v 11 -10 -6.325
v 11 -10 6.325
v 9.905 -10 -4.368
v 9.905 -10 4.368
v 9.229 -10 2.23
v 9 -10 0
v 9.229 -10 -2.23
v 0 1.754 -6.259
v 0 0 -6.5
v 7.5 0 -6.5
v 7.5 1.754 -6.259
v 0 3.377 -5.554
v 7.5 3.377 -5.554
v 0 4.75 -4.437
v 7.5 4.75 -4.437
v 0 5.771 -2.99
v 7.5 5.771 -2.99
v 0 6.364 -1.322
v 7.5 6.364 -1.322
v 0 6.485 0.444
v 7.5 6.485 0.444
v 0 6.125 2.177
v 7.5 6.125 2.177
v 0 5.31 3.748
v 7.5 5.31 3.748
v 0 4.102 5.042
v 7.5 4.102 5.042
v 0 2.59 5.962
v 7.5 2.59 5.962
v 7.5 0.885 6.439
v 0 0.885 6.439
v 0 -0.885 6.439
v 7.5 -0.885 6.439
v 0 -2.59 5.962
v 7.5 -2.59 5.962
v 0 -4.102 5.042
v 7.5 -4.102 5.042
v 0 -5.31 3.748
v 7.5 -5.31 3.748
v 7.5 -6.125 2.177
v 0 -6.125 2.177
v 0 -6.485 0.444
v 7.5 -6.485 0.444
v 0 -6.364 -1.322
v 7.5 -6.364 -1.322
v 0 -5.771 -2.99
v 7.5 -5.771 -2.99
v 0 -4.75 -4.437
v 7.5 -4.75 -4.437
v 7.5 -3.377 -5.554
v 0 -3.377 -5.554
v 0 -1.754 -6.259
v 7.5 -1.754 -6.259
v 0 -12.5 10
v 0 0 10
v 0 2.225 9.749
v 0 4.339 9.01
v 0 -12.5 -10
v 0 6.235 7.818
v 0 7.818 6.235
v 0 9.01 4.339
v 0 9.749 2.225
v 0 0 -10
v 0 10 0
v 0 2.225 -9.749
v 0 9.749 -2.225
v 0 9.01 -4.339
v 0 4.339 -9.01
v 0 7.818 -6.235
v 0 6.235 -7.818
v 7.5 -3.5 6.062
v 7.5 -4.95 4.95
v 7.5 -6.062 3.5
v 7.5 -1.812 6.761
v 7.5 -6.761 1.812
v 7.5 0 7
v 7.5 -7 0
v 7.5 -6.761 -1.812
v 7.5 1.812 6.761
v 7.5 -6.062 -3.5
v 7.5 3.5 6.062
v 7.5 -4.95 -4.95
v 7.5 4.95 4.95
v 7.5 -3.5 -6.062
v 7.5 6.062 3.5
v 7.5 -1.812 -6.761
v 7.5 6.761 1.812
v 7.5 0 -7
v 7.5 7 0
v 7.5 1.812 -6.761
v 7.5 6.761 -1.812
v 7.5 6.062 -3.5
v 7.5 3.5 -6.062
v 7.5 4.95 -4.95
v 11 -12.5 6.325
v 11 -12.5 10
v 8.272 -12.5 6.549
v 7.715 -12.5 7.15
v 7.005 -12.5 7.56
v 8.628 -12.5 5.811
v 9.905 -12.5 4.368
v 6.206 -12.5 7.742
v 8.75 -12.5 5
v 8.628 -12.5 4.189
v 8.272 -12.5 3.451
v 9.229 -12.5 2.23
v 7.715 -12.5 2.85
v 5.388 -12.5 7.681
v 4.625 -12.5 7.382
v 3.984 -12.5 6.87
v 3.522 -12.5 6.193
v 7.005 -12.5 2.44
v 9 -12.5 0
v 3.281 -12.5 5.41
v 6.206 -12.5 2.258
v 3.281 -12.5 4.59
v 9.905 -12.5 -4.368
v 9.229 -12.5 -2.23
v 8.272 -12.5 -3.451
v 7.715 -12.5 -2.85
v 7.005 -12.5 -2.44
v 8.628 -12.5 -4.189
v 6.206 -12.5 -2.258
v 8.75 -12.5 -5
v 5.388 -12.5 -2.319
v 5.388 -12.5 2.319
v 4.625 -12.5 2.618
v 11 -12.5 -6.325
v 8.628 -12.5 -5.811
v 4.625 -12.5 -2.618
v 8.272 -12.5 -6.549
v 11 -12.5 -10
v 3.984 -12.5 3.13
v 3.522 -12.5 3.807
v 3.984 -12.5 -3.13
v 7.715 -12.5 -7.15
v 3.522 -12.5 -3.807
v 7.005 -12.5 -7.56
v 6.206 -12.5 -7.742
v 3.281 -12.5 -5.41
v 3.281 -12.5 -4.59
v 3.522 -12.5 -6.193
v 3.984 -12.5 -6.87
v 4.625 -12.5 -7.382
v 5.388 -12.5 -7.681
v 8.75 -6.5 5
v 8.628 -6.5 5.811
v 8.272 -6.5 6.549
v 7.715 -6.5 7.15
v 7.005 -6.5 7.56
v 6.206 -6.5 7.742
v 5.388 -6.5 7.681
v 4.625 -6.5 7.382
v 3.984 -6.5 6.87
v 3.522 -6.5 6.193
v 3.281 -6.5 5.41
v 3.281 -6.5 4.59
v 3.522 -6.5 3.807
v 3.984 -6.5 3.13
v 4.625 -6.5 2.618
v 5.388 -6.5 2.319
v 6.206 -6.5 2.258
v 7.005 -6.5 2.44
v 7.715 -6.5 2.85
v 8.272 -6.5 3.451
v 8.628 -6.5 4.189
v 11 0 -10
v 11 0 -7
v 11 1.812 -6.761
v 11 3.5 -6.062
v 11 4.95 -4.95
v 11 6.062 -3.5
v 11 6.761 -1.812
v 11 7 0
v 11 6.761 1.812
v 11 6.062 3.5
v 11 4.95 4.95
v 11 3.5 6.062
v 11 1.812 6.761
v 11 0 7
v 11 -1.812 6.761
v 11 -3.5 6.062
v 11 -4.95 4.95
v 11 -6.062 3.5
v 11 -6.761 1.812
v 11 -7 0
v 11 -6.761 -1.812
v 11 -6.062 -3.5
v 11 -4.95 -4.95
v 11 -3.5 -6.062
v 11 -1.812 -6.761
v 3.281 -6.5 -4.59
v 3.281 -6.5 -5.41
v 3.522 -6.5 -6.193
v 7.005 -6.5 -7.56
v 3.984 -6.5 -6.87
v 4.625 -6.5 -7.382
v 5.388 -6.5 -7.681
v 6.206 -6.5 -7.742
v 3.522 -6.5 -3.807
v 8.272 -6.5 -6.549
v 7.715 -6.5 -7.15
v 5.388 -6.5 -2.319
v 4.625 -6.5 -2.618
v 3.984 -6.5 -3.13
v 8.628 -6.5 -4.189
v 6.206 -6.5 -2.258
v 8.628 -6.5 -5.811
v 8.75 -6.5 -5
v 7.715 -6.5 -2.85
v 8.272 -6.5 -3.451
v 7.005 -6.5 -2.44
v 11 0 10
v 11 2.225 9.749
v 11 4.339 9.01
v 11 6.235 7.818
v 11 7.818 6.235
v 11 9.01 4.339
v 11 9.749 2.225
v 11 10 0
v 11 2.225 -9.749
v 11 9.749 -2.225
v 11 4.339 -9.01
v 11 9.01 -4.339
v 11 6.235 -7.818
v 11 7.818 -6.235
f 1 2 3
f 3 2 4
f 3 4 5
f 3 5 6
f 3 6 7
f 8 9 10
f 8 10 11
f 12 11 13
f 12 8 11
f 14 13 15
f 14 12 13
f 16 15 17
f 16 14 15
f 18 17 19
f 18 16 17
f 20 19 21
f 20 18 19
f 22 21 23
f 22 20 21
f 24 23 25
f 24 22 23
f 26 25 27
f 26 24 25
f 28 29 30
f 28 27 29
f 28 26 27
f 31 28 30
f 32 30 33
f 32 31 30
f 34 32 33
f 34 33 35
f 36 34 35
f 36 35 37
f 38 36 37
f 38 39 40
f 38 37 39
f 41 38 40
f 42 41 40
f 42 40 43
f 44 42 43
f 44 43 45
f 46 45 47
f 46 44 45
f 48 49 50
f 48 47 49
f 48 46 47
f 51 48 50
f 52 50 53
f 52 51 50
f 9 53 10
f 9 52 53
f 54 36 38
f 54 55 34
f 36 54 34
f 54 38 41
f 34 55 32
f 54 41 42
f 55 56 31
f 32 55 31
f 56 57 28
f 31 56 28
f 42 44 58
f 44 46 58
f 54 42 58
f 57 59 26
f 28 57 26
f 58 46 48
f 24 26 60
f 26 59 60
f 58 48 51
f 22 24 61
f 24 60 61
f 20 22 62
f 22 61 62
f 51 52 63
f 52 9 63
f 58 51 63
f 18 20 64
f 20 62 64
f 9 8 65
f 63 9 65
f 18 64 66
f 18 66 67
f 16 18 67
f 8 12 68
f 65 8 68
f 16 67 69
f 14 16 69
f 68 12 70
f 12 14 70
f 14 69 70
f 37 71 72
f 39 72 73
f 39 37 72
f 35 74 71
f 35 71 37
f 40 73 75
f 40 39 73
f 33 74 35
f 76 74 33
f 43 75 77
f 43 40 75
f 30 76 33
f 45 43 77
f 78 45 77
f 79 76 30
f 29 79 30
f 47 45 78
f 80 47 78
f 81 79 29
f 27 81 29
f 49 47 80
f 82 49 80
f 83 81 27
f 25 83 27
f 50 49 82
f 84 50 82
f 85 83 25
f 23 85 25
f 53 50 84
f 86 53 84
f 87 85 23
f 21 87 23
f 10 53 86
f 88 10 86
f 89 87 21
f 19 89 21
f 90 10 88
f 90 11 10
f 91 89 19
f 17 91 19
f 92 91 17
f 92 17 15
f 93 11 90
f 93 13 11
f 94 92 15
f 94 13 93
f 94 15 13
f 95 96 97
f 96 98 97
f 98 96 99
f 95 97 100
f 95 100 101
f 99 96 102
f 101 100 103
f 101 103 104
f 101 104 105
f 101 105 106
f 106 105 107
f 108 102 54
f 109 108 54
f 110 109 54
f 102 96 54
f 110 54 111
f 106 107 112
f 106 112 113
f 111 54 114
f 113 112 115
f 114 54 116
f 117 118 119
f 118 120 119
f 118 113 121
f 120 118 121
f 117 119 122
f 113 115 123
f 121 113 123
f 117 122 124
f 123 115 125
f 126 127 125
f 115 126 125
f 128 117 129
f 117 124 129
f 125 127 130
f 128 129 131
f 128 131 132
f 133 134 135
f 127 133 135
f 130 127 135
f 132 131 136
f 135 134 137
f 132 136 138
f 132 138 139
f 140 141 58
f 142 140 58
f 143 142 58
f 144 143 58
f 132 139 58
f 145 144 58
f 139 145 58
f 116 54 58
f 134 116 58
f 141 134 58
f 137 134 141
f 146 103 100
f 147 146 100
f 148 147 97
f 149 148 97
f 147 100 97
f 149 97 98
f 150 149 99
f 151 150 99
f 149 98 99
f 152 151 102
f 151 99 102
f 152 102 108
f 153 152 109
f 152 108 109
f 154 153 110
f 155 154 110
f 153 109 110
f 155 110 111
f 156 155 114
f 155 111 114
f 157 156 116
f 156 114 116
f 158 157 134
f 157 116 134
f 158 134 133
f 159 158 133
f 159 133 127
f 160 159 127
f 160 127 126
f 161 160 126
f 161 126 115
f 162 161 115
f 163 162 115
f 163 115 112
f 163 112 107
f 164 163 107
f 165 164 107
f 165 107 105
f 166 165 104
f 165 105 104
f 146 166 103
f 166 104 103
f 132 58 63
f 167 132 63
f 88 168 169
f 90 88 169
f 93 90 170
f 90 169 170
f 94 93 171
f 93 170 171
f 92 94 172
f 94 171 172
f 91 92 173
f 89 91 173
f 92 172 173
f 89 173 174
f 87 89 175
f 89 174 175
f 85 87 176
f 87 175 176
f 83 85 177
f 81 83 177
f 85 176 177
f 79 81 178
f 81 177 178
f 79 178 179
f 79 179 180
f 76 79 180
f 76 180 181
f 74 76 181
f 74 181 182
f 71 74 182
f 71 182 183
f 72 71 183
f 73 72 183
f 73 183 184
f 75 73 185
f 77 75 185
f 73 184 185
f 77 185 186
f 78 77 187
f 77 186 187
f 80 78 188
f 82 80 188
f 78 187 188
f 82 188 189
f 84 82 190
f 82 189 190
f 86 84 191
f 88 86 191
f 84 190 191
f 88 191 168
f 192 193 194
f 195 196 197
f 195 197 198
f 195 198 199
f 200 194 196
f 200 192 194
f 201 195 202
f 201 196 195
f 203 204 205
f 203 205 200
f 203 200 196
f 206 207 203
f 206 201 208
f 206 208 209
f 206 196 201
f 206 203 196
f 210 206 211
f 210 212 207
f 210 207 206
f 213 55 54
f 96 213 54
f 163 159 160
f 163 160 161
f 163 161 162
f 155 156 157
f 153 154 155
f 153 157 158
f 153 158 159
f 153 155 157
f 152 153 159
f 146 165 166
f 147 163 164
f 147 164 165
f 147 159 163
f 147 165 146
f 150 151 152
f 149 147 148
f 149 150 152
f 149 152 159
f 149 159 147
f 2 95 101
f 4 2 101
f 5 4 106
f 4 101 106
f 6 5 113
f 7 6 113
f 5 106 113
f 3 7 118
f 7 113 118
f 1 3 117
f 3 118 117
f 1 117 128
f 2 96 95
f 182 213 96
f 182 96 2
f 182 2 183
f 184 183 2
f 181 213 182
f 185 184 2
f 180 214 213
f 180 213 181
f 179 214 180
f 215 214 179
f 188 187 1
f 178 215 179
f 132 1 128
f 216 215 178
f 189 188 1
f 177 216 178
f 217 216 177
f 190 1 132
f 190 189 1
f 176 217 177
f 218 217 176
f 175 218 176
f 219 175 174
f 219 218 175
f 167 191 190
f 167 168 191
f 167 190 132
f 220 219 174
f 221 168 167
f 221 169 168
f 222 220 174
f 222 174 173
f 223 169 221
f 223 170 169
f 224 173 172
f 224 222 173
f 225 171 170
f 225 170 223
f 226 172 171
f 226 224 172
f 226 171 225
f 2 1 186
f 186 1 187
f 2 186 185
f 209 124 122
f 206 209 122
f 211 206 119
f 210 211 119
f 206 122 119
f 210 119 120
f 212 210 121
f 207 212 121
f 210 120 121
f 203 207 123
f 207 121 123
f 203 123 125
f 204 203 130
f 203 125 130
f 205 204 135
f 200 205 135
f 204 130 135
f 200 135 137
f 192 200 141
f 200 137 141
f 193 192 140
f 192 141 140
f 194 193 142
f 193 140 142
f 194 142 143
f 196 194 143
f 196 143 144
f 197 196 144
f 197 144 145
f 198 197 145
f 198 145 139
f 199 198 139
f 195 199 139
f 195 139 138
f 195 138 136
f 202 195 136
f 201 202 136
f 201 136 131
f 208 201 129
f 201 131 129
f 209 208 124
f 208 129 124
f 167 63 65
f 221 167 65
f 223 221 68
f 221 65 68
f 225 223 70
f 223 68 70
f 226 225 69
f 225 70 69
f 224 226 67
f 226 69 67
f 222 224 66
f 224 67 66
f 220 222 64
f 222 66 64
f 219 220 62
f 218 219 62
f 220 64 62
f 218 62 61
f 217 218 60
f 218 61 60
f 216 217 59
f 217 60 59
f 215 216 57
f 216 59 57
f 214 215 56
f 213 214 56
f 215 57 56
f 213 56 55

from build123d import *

# Parameters (mm, degrees)
SKIZZE1_R                       = 6.5
AUFSATZ_LINEAR_AUSTRAGEN1_DEPTH = 11
SKIZZE2_R                       = 7
SCHNITT_LINEAR_AUSTRAGEN1_DEPTH = 3.5
SKIZZE3_R                       = 2.75
SCHNITT_LINEAR_AUSTRAGEN2_DEPTH = 6
SKIZZE4_R                       = 11
SCHNITT_LINEAR_AUSTRAGEN3_DEPTH = 2.5


with BuildPart() as part:
    # Skizze1 → Aufsatz-Linear austragen1 (new body)
    with BuildSketch(Plane(origin=(0, 0, 0), x_dir=(0, 0, -1), z_dir=(1, 0, 0))):
        with BuildLine():
            Line((-10, 0), (-10, -12.5))
            Line((-10, -12.5), (10, -12.5))
            Line((10, -12.5), (10, 0))
            ThreePointArc((10, 0), (0, 10), (-10, 0))
        make_face()
        Circle(SKIZZE1_R, mode=Mode.SUBTRACT)
    extrude(amount=AUFSATZ_LINEAR_AUSTRAGEN1_DEPTH)

    # Skizze2 → Schnitt-Linear austragen1 (cut)
    with BuildSketch(Plane(origin=(11, 0, 0), x_dir=(0, 0, -1), z_dir=(1, 0, 0))):
        Circle(SKIZZE2_R)
    extrude(amount=-SCHNITT_LINEAR_AUSTRAGEN1_DEPTH, mode=Mode.SUBTRACT)

    # Skizze3 → Schnitt-Linear austragen2 (cut)
    with BuildSketch(Plane.XZ.offset(12.5)):
        with Locations((6, 5)):
            Circle(SKIZZE3_R)
        with Locations((6, -5)):
            Circle(SKIZZE3_R)
    extrude(amount=-SCHNITT_LINEAR_AUSTRAGEN2_DEPTH, mode=Mode.SUBTRACT)

    # Skizze4 → Schnitt-Linear austragen3 (cut)
    with BuildSketch(Plane.XZ.offset(12.5)):
        with Locations((20, 0)):
            Circle(SKIZZE4_R)
    extrude(amount=-SCHNITT_LINEAR_AUSTRAGEN3_DEPTH, mode=Mode.SUBTRACT)


solid = part.part
